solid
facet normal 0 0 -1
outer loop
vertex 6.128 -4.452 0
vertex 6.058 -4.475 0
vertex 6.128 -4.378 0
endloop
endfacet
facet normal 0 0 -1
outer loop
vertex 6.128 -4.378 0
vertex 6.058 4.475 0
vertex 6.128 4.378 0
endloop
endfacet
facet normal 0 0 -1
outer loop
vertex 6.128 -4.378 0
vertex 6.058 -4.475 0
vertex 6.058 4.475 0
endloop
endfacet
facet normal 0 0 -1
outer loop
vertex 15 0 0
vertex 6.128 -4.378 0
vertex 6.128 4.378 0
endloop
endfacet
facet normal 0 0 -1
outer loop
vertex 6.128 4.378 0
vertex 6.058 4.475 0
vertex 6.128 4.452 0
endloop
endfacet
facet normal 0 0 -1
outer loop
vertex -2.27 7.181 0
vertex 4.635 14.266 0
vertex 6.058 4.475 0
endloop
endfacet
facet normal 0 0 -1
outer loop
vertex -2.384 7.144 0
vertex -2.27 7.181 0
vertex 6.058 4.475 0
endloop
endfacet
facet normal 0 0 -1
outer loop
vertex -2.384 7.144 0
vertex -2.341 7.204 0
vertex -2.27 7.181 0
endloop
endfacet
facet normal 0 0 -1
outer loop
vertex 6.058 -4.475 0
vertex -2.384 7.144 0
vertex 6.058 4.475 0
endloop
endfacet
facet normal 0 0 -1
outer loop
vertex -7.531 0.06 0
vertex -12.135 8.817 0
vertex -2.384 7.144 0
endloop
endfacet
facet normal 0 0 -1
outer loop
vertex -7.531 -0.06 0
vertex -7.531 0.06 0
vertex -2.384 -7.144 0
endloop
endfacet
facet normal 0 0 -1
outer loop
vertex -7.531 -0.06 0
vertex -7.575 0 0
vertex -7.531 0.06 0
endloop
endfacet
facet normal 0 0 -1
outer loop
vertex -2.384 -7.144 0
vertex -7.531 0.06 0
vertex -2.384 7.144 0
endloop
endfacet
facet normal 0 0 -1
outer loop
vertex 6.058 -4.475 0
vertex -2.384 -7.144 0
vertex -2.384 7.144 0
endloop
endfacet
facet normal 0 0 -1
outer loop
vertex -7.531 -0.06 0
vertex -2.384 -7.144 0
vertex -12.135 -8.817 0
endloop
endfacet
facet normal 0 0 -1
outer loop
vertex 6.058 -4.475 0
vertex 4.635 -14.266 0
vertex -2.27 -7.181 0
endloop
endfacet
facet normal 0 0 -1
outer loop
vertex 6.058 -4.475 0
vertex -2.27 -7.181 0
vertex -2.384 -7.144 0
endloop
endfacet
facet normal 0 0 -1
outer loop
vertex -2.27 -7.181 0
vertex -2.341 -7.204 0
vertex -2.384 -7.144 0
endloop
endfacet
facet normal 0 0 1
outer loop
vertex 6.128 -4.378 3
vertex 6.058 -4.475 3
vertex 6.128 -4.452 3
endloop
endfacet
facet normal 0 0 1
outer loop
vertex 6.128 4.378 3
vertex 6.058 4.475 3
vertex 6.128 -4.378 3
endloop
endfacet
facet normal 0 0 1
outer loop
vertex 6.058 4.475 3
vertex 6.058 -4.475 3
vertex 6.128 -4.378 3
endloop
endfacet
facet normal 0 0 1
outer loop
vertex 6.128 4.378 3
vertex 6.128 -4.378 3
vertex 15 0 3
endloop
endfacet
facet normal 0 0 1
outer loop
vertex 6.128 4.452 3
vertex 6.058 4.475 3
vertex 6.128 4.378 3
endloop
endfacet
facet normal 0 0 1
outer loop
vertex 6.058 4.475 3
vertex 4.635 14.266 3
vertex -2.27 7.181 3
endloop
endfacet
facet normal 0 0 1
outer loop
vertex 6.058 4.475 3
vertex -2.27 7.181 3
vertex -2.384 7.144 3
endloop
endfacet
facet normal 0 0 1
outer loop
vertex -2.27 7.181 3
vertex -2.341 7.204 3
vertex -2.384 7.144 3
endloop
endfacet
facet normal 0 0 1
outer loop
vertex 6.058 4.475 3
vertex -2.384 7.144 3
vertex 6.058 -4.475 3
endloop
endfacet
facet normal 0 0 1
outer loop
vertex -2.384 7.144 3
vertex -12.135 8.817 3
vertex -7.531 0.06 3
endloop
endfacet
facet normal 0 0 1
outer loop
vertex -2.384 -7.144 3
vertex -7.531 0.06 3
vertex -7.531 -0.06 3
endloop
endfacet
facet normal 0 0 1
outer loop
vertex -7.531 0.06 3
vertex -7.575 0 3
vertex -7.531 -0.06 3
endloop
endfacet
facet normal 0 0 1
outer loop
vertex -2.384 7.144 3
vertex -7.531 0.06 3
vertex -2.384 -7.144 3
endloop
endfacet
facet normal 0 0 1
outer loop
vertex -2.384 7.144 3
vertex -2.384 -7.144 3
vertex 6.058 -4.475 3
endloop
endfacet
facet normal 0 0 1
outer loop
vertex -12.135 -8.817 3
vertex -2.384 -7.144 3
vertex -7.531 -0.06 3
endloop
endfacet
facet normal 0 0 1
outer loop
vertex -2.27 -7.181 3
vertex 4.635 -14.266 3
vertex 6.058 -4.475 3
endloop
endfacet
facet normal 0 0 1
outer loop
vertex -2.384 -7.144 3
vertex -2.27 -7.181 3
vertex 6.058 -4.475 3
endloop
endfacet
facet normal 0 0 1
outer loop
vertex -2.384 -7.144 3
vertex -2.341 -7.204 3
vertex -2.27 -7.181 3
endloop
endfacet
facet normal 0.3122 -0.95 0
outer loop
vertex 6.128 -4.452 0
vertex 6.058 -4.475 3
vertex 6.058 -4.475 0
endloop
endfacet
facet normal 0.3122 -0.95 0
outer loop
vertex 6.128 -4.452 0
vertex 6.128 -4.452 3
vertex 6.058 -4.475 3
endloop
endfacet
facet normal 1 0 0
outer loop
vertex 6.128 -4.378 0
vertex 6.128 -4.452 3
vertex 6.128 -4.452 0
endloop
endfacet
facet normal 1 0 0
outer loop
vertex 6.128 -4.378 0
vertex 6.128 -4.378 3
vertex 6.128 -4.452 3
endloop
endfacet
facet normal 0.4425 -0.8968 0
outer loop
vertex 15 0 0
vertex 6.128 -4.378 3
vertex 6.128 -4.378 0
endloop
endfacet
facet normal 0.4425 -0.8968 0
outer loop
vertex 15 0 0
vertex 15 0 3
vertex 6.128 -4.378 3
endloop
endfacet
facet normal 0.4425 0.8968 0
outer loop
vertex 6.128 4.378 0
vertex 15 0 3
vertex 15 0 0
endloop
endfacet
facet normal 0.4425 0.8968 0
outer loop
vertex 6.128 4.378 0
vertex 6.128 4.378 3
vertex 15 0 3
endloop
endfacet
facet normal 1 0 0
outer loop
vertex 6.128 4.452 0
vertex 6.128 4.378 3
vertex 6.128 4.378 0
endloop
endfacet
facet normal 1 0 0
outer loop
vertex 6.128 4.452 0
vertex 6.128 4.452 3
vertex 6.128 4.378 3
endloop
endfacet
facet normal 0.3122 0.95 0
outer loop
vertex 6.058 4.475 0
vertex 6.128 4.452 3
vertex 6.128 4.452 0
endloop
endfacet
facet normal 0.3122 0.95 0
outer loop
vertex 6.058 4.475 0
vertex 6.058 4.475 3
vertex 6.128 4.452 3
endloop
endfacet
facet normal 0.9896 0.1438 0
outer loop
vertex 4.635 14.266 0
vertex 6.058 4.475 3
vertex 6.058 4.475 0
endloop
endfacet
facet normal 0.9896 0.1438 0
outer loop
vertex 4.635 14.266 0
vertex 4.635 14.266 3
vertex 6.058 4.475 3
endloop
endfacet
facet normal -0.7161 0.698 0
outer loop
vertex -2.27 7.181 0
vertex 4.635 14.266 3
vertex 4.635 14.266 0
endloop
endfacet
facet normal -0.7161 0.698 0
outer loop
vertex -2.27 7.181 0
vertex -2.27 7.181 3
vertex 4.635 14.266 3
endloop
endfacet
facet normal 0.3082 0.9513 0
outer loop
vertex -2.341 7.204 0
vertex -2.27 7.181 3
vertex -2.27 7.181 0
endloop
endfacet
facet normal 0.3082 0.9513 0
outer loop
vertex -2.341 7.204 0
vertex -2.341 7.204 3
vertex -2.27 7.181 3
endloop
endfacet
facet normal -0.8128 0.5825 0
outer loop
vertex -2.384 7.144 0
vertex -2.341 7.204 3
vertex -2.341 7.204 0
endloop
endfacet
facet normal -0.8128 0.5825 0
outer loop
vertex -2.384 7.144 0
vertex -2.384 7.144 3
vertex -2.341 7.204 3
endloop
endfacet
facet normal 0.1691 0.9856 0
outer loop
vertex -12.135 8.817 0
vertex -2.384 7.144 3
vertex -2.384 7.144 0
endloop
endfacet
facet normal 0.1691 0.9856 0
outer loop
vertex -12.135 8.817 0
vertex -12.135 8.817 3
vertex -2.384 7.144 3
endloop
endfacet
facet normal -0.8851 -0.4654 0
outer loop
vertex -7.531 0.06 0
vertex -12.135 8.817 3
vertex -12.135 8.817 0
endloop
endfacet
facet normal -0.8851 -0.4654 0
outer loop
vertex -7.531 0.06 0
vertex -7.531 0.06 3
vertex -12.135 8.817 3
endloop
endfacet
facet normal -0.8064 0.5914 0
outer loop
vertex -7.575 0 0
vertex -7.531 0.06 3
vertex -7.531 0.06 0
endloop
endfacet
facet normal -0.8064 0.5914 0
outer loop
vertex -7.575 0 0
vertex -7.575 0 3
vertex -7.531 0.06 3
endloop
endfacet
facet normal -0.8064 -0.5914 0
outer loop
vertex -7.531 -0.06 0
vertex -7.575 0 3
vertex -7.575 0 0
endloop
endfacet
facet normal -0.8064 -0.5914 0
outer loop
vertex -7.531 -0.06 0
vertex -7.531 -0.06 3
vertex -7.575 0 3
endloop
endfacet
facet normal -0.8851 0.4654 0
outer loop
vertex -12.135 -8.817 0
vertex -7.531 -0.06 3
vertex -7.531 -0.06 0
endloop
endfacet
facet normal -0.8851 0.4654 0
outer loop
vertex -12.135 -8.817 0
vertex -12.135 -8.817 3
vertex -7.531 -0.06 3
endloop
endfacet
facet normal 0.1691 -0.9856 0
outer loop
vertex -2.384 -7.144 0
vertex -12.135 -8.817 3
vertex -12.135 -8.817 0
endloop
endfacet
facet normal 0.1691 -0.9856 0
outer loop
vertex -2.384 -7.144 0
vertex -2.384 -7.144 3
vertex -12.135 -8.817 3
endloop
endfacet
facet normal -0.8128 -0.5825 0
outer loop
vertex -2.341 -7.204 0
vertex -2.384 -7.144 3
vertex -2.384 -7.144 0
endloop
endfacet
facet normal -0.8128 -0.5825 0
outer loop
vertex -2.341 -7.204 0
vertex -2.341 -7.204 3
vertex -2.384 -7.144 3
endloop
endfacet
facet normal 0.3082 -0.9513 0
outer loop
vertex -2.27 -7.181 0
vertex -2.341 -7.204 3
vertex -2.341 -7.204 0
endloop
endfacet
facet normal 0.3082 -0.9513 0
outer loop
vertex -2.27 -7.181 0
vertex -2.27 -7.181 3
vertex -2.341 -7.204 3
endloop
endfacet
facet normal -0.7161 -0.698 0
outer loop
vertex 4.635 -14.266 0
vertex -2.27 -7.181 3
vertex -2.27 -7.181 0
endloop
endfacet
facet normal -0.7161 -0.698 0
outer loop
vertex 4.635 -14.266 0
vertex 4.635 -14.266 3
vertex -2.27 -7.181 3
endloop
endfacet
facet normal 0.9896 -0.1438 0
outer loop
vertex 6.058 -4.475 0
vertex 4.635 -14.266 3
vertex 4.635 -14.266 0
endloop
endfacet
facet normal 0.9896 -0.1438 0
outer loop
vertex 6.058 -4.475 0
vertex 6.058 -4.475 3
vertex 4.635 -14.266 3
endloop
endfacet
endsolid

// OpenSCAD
//-- Parametric star
//-- (c)  2010 Juan Gonzalez-Gomez (Obijuan) juan@iearobotics.com
//-- GPL license

//-- The 2*N points of an N-ponted star are calculated as follows:
//-- There are two circunferences:  the inner and outer.  Outer points are located
//-- at angles: 0, 360/N, 360*2/N and on the outer circunference
//-- The inner points have the same angular distance but they are 360/(2*N) rotated
//-- respect to the outers. They are located on the inner circunference

//--- INPUT PARAMETERS:
//--- N: Number of points
//--  h: Height
//-- ri: Inner radius
//-- ro: outer radius
module parametric_star(N=5, h=3, ri=15, re=30) {

  //-- Calculate and draw a 2D tip of the star
 //-- INPUT:
 //-- n: Number of the tip (from 0 to N-1)
  module tipstar(n) {
     i1 =  [ri*cos(-360*n/N+360/(N*2)), ri*sin(-360*n/N+360/(N*2))];
    e1 = [re*cos(-360*n/N), re*sin(-360*n/N)];
    i2 = [ri*cos(-360*(n+1)/N+360/(N*2)), ri*sin(-360*(n+1)/N+360/(N*2))];
    polygon([ i1, e1, i2]);
  }

  //-- Draw the 2D star and extrude

   //-- The star is the union of N 2D tips.
   //-- A inner cylinder is also needed for filling
   //-- A flat (2D) star is built. The it is extruded
    linear_extrude(height=h)
    union() {
      for (i=[0:N-1]) {
         tipstar(i);
      }
      rotate([0,0,360/(2*N)]) circle(r=ri+ri*0.01,$fn=N);
    }
}

//-- Example
parametric_star(N=5, ri=15/2,re=15);
